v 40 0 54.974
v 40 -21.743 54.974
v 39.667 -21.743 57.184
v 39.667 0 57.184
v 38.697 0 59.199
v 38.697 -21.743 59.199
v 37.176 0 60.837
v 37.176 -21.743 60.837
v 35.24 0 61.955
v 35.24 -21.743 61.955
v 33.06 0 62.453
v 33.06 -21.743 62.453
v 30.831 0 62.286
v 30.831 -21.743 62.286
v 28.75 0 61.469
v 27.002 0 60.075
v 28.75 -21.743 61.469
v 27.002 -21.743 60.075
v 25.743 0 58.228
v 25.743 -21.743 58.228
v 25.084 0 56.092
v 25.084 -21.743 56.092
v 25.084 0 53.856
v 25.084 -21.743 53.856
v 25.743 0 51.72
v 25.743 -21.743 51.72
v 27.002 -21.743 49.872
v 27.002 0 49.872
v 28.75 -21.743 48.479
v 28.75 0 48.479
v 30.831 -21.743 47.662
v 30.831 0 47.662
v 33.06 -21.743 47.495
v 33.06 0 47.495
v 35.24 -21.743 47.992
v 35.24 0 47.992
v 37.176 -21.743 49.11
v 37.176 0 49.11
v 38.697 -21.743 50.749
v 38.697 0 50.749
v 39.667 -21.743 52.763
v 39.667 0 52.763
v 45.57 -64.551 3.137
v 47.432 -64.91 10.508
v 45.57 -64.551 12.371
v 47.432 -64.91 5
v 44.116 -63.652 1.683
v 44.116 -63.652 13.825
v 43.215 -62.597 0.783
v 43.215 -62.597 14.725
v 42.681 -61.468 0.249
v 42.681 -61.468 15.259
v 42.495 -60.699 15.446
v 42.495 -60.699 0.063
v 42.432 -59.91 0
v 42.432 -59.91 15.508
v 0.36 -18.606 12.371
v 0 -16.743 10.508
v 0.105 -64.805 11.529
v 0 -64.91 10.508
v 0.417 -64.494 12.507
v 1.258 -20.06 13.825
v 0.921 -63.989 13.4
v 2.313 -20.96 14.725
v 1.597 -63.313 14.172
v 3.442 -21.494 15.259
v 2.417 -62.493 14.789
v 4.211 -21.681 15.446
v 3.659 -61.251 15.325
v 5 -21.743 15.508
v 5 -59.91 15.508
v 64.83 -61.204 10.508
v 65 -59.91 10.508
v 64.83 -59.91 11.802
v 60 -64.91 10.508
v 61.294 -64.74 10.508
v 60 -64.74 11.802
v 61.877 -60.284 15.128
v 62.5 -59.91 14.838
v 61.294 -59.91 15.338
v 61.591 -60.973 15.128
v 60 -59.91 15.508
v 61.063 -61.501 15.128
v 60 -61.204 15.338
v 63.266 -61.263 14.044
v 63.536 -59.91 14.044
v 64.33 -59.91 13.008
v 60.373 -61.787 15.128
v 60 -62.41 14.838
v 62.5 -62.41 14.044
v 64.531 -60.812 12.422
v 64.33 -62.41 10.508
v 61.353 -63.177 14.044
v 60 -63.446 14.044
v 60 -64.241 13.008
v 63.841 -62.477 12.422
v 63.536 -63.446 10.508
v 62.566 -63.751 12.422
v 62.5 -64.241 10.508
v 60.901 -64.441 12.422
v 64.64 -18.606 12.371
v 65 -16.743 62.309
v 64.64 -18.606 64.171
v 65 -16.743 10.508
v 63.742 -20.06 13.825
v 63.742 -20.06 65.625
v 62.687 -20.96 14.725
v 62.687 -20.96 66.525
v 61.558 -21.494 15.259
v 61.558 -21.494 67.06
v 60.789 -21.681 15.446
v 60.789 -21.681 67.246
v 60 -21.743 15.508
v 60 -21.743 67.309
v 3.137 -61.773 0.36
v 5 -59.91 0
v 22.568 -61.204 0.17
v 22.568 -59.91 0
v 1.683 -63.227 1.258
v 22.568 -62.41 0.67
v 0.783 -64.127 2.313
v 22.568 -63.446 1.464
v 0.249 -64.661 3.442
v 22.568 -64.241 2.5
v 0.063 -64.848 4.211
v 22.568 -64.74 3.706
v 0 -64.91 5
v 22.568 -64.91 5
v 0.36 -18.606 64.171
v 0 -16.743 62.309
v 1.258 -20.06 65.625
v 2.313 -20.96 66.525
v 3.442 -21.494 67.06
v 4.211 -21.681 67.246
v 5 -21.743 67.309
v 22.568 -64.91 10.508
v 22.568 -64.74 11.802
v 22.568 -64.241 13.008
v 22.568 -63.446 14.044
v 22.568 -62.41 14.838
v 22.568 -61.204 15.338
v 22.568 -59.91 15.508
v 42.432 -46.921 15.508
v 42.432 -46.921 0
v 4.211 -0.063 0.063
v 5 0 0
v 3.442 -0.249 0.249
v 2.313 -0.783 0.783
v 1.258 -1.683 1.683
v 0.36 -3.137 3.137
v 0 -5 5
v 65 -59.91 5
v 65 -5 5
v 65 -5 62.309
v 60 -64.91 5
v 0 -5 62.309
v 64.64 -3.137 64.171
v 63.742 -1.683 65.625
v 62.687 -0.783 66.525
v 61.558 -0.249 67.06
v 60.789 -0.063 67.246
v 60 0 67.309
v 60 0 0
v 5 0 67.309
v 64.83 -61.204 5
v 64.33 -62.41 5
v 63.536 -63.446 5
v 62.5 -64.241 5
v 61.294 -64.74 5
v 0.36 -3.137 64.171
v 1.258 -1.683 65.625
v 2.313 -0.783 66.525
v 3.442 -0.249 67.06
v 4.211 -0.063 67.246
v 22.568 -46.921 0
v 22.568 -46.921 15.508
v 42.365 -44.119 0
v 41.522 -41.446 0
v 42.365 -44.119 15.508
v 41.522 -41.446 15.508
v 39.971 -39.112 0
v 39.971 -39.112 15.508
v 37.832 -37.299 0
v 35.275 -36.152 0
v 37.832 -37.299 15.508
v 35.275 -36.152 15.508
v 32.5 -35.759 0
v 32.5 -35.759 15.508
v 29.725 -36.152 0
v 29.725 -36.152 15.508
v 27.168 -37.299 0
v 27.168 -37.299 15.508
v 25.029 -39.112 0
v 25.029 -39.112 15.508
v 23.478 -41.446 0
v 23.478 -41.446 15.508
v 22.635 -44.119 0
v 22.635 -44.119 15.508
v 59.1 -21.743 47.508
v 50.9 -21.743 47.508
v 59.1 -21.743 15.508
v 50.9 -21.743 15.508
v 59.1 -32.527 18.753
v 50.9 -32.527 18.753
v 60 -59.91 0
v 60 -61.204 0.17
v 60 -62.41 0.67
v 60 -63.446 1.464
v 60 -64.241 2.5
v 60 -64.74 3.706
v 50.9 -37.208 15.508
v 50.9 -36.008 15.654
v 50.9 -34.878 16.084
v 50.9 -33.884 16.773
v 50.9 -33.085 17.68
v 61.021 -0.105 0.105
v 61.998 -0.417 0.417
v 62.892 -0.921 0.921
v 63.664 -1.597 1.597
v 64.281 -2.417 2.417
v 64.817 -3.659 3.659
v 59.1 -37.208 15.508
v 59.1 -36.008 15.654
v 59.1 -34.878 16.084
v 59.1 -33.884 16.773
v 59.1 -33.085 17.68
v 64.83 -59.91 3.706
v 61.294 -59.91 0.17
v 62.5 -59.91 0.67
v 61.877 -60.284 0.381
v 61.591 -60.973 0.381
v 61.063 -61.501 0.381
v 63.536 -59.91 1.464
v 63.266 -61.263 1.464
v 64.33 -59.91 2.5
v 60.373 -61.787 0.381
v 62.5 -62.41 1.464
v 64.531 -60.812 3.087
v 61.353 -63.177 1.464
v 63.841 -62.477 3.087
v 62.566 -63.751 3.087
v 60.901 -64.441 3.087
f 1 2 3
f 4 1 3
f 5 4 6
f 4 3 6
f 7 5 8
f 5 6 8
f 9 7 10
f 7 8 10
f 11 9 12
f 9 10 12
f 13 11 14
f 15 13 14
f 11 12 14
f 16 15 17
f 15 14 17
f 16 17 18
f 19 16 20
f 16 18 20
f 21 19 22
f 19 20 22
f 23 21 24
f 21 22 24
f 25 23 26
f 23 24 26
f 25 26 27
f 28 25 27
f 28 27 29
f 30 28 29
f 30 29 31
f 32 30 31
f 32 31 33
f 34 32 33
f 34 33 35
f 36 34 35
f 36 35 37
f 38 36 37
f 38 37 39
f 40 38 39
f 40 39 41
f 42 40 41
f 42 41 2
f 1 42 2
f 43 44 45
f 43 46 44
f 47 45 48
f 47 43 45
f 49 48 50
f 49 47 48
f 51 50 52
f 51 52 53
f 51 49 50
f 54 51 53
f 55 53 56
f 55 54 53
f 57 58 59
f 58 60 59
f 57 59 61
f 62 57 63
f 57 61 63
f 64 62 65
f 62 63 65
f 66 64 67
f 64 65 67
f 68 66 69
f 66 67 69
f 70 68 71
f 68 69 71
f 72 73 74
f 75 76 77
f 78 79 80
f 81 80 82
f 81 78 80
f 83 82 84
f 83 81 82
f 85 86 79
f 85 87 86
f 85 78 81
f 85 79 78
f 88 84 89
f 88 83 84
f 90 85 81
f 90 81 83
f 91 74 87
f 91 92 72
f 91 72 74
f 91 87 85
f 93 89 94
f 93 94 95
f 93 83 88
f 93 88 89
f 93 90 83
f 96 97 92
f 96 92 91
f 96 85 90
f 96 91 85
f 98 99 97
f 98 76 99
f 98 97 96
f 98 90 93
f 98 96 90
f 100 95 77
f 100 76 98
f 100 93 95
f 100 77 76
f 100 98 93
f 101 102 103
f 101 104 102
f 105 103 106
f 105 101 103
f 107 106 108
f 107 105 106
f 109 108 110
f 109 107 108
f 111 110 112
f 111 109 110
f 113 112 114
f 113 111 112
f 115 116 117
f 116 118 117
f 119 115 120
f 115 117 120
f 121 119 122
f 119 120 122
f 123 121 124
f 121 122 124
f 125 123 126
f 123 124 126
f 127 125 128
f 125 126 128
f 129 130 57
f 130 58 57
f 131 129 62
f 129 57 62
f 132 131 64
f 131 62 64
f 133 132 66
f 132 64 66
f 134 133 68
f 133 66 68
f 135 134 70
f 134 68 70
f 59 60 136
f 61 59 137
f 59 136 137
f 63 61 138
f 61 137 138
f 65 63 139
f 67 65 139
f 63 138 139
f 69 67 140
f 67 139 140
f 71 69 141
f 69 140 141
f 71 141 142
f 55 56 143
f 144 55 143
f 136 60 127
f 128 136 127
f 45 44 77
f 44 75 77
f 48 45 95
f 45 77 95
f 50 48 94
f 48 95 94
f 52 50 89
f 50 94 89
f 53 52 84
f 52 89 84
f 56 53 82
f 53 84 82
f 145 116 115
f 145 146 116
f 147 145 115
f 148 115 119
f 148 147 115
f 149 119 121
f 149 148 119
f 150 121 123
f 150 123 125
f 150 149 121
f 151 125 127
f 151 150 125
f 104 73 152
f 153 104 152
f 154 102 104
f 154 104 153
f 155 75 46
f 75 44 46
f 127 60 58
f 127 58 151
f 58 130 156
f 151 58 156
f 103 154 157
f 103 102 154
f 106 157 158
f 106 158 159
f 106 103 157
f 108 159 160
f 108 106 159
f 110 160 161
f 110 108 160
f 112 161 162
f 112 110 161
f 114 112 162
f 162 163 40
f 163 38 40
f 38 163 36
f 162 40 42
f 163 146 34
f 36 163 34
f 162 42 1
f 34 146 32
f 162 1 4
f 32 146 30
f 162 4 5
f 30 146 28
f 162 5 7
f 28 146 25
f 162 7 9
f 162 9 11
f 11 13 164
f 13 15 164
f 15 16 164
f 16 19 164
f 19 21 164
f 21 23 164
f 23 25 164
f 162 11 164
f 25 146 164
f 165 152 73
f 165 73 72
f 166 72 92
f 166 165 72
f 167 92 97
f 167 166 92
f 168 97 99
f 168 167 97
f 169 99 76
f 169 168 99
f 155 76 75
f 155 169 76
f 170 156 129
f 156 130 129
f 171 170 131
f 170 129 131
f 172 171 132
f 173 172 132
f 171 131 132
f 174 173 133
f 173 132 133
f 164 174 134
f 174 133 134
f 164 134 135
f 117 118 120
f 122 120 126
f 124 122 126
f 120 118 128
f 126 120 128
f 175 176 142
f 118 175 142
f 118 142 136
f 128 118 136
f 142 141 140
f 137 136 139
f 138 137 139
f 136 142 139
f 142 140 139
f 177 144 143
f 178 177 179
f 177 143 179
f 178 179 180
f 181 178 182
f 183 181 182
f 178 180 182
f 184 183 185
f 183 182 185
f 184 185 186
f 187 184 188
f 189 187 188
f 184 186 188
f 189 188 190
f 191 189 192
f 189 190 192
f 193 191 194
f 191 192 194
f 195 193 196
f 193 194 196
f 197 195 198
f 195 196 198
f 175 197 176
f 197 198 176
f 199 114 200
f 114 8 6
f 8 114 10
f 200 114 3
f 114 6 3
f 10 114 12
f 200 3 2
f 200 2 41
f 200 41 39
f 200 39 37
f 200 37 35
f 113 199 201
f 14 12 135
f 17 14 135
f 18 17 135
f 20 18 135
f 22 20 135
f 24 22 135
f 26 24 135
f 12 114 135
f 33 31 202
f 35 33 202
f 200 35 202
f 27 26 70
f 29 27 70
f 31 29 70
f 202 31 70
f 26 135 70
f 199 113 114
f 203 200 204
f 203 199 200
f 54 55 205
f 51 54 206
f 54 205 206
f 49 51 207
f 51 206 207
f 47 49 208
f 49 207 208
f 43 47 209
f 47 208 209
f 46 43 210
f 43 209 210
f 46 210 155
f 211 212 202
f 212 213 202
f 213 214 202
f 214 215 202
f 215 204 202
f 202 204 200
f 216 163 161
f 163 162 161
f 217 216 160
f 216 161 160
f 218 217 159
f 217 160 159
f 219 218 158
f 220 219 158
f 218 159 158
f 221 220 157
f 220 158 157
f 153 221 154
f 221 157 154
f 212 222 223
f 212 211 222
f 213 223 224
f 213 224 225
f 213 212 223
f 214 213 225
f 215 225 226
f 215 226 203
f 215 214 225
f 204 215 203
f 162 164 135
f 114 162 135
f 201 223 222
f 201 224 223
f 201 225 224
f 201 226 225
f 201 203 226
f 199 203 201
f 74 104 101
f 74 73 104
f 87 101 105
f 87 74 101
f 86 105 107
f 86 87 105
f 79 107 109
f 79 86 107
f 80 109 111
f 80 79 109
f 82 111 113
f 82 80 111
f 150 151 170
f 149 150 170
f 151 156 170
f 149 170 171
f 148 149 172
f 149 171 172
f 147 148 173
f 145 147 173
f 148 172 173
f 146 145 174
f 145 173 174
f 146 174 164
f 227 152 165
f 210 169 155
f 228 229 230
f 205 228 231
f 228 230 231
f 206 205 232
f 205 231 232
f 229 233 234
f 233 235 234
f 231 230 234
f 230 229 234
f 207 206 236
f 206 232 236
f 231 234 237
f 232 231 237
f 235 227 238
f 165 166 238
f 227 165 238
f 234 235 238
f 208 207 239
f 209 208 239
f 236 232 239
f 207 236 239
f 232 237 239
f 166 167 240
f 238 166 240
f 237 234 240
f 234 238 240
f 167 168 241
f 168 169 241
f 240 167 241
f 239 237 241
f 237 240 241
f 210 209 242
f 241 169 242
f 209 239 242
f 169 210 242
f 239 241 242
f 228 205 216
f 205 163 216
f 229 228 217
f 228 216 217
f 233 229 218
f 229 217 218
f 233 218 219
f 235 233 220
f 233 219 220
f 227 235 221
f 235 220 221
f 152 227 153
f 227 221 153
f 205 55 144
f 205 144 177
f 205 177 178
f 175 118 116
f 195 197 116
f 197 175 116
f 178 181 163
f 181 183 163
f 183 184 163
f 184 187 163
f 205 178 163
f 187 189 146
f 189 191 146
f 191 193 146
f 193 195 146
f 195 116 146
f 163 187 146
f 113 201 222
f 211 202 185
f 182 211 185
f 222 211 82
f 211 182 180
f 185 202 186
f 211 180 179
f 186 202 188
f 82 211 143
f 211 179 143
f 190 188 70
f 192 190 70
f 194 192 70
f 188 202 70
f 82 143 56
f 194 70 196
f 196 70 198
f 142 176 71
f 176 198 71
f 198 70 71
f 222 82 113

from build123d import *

# Parameters (mm, degrees)
F1_DEPTH = 65
F2_R     = 7.5
F3_DEPTH = 25
F5_DEPTH = 15.5081460252
F8_DEPTH = 4.1
F9_R     = 5


with BuildPart() as f1:
    # F0 (on Right) → F1 (new body)
    with BuildSketch(Plane.YZ):
        Polygon((-64.9103820324, 0), (0, 0), (0, 67.3085525632), (-21.7433813959, 67.3085525632), (-21.7433813959, 15.5081460252), (-64.9103820324, 15.5081460252), align=None)
    extrude(amount=F1_DEPTH)

    # F2 (on face) → F3 (cut)
    with BuildSketch(Plane.XZ.offset(21.7433813959)):
        with Locations((32.5, 54.9736991525)):
            Circle(F2_R)
    extrude(amount=-F3_DEPTH, mode=Mode.SUBTRACT)

    # F4 (on face) → F5 (cut, through all)
    with BuildSketch(Plane.XY.offset(15.5081460252)):
        with BuildLine():
            Line((42.4322629764, -64.9103820324), (42.4322629764, -46.9211071186))
            ThreePointArc((42.4322629764, -46.9211071186), (32.5, -35.7591466337), (22.5677370236, -46.9211071186))
            Line((22.5677370236, -46.9211071186), (22.5677370236, -64.9103820324))
            Line((22.5677370236, -64.9103820324), (42.4322629764, -64.9103820324))
        make_face()
    extrude(amount=-F5_DEPTH, mode=Mode.SUBTRACT)

    # F7 (on offset) → F8 (join, symmetric)
    with BuildSketch(Plane.YZ.offset(55)):
        Polygon((-21.7433813959, 15.5081460252), (-21.7433813959, 47.5081460252), (-33.7433813959, 15.5081460252), align=None)
    extrude(amount=F8_DEPTH, both=True)

    # F9
    f9_edges = [f1.edges().sort_by_distance(p)[0] for p in [
        (0, -10.871691, 67.308553),
        (65, -10.871691, 67.308553),
        (11.283869, -64.910382, 15.508146),
        (0, -43.326882, 15.508146),
        (0, -21.743381, 41.408349),
        (0, 0, 33.654276),
        (0, -32.455191, 0),
        (11.283869, -64.910382, 0),
        (65, -64.910382, 7.754073),
        (65, -43.326882, 15.508146),
        (65, -21.743381, 41.408349),
        (65, 0, 33.654276),
        (65, -32.455191, 0),
        (42.432263, -64.910382, 7.754073),
        (53.716131, -64.910382, 0),
        (53.716131, -64.910382, 15.508146),
        (55, -33.743381, 15.508146),
    ]]
    fillet(f9_edges, radius=F9_R)


solid = f1.part
